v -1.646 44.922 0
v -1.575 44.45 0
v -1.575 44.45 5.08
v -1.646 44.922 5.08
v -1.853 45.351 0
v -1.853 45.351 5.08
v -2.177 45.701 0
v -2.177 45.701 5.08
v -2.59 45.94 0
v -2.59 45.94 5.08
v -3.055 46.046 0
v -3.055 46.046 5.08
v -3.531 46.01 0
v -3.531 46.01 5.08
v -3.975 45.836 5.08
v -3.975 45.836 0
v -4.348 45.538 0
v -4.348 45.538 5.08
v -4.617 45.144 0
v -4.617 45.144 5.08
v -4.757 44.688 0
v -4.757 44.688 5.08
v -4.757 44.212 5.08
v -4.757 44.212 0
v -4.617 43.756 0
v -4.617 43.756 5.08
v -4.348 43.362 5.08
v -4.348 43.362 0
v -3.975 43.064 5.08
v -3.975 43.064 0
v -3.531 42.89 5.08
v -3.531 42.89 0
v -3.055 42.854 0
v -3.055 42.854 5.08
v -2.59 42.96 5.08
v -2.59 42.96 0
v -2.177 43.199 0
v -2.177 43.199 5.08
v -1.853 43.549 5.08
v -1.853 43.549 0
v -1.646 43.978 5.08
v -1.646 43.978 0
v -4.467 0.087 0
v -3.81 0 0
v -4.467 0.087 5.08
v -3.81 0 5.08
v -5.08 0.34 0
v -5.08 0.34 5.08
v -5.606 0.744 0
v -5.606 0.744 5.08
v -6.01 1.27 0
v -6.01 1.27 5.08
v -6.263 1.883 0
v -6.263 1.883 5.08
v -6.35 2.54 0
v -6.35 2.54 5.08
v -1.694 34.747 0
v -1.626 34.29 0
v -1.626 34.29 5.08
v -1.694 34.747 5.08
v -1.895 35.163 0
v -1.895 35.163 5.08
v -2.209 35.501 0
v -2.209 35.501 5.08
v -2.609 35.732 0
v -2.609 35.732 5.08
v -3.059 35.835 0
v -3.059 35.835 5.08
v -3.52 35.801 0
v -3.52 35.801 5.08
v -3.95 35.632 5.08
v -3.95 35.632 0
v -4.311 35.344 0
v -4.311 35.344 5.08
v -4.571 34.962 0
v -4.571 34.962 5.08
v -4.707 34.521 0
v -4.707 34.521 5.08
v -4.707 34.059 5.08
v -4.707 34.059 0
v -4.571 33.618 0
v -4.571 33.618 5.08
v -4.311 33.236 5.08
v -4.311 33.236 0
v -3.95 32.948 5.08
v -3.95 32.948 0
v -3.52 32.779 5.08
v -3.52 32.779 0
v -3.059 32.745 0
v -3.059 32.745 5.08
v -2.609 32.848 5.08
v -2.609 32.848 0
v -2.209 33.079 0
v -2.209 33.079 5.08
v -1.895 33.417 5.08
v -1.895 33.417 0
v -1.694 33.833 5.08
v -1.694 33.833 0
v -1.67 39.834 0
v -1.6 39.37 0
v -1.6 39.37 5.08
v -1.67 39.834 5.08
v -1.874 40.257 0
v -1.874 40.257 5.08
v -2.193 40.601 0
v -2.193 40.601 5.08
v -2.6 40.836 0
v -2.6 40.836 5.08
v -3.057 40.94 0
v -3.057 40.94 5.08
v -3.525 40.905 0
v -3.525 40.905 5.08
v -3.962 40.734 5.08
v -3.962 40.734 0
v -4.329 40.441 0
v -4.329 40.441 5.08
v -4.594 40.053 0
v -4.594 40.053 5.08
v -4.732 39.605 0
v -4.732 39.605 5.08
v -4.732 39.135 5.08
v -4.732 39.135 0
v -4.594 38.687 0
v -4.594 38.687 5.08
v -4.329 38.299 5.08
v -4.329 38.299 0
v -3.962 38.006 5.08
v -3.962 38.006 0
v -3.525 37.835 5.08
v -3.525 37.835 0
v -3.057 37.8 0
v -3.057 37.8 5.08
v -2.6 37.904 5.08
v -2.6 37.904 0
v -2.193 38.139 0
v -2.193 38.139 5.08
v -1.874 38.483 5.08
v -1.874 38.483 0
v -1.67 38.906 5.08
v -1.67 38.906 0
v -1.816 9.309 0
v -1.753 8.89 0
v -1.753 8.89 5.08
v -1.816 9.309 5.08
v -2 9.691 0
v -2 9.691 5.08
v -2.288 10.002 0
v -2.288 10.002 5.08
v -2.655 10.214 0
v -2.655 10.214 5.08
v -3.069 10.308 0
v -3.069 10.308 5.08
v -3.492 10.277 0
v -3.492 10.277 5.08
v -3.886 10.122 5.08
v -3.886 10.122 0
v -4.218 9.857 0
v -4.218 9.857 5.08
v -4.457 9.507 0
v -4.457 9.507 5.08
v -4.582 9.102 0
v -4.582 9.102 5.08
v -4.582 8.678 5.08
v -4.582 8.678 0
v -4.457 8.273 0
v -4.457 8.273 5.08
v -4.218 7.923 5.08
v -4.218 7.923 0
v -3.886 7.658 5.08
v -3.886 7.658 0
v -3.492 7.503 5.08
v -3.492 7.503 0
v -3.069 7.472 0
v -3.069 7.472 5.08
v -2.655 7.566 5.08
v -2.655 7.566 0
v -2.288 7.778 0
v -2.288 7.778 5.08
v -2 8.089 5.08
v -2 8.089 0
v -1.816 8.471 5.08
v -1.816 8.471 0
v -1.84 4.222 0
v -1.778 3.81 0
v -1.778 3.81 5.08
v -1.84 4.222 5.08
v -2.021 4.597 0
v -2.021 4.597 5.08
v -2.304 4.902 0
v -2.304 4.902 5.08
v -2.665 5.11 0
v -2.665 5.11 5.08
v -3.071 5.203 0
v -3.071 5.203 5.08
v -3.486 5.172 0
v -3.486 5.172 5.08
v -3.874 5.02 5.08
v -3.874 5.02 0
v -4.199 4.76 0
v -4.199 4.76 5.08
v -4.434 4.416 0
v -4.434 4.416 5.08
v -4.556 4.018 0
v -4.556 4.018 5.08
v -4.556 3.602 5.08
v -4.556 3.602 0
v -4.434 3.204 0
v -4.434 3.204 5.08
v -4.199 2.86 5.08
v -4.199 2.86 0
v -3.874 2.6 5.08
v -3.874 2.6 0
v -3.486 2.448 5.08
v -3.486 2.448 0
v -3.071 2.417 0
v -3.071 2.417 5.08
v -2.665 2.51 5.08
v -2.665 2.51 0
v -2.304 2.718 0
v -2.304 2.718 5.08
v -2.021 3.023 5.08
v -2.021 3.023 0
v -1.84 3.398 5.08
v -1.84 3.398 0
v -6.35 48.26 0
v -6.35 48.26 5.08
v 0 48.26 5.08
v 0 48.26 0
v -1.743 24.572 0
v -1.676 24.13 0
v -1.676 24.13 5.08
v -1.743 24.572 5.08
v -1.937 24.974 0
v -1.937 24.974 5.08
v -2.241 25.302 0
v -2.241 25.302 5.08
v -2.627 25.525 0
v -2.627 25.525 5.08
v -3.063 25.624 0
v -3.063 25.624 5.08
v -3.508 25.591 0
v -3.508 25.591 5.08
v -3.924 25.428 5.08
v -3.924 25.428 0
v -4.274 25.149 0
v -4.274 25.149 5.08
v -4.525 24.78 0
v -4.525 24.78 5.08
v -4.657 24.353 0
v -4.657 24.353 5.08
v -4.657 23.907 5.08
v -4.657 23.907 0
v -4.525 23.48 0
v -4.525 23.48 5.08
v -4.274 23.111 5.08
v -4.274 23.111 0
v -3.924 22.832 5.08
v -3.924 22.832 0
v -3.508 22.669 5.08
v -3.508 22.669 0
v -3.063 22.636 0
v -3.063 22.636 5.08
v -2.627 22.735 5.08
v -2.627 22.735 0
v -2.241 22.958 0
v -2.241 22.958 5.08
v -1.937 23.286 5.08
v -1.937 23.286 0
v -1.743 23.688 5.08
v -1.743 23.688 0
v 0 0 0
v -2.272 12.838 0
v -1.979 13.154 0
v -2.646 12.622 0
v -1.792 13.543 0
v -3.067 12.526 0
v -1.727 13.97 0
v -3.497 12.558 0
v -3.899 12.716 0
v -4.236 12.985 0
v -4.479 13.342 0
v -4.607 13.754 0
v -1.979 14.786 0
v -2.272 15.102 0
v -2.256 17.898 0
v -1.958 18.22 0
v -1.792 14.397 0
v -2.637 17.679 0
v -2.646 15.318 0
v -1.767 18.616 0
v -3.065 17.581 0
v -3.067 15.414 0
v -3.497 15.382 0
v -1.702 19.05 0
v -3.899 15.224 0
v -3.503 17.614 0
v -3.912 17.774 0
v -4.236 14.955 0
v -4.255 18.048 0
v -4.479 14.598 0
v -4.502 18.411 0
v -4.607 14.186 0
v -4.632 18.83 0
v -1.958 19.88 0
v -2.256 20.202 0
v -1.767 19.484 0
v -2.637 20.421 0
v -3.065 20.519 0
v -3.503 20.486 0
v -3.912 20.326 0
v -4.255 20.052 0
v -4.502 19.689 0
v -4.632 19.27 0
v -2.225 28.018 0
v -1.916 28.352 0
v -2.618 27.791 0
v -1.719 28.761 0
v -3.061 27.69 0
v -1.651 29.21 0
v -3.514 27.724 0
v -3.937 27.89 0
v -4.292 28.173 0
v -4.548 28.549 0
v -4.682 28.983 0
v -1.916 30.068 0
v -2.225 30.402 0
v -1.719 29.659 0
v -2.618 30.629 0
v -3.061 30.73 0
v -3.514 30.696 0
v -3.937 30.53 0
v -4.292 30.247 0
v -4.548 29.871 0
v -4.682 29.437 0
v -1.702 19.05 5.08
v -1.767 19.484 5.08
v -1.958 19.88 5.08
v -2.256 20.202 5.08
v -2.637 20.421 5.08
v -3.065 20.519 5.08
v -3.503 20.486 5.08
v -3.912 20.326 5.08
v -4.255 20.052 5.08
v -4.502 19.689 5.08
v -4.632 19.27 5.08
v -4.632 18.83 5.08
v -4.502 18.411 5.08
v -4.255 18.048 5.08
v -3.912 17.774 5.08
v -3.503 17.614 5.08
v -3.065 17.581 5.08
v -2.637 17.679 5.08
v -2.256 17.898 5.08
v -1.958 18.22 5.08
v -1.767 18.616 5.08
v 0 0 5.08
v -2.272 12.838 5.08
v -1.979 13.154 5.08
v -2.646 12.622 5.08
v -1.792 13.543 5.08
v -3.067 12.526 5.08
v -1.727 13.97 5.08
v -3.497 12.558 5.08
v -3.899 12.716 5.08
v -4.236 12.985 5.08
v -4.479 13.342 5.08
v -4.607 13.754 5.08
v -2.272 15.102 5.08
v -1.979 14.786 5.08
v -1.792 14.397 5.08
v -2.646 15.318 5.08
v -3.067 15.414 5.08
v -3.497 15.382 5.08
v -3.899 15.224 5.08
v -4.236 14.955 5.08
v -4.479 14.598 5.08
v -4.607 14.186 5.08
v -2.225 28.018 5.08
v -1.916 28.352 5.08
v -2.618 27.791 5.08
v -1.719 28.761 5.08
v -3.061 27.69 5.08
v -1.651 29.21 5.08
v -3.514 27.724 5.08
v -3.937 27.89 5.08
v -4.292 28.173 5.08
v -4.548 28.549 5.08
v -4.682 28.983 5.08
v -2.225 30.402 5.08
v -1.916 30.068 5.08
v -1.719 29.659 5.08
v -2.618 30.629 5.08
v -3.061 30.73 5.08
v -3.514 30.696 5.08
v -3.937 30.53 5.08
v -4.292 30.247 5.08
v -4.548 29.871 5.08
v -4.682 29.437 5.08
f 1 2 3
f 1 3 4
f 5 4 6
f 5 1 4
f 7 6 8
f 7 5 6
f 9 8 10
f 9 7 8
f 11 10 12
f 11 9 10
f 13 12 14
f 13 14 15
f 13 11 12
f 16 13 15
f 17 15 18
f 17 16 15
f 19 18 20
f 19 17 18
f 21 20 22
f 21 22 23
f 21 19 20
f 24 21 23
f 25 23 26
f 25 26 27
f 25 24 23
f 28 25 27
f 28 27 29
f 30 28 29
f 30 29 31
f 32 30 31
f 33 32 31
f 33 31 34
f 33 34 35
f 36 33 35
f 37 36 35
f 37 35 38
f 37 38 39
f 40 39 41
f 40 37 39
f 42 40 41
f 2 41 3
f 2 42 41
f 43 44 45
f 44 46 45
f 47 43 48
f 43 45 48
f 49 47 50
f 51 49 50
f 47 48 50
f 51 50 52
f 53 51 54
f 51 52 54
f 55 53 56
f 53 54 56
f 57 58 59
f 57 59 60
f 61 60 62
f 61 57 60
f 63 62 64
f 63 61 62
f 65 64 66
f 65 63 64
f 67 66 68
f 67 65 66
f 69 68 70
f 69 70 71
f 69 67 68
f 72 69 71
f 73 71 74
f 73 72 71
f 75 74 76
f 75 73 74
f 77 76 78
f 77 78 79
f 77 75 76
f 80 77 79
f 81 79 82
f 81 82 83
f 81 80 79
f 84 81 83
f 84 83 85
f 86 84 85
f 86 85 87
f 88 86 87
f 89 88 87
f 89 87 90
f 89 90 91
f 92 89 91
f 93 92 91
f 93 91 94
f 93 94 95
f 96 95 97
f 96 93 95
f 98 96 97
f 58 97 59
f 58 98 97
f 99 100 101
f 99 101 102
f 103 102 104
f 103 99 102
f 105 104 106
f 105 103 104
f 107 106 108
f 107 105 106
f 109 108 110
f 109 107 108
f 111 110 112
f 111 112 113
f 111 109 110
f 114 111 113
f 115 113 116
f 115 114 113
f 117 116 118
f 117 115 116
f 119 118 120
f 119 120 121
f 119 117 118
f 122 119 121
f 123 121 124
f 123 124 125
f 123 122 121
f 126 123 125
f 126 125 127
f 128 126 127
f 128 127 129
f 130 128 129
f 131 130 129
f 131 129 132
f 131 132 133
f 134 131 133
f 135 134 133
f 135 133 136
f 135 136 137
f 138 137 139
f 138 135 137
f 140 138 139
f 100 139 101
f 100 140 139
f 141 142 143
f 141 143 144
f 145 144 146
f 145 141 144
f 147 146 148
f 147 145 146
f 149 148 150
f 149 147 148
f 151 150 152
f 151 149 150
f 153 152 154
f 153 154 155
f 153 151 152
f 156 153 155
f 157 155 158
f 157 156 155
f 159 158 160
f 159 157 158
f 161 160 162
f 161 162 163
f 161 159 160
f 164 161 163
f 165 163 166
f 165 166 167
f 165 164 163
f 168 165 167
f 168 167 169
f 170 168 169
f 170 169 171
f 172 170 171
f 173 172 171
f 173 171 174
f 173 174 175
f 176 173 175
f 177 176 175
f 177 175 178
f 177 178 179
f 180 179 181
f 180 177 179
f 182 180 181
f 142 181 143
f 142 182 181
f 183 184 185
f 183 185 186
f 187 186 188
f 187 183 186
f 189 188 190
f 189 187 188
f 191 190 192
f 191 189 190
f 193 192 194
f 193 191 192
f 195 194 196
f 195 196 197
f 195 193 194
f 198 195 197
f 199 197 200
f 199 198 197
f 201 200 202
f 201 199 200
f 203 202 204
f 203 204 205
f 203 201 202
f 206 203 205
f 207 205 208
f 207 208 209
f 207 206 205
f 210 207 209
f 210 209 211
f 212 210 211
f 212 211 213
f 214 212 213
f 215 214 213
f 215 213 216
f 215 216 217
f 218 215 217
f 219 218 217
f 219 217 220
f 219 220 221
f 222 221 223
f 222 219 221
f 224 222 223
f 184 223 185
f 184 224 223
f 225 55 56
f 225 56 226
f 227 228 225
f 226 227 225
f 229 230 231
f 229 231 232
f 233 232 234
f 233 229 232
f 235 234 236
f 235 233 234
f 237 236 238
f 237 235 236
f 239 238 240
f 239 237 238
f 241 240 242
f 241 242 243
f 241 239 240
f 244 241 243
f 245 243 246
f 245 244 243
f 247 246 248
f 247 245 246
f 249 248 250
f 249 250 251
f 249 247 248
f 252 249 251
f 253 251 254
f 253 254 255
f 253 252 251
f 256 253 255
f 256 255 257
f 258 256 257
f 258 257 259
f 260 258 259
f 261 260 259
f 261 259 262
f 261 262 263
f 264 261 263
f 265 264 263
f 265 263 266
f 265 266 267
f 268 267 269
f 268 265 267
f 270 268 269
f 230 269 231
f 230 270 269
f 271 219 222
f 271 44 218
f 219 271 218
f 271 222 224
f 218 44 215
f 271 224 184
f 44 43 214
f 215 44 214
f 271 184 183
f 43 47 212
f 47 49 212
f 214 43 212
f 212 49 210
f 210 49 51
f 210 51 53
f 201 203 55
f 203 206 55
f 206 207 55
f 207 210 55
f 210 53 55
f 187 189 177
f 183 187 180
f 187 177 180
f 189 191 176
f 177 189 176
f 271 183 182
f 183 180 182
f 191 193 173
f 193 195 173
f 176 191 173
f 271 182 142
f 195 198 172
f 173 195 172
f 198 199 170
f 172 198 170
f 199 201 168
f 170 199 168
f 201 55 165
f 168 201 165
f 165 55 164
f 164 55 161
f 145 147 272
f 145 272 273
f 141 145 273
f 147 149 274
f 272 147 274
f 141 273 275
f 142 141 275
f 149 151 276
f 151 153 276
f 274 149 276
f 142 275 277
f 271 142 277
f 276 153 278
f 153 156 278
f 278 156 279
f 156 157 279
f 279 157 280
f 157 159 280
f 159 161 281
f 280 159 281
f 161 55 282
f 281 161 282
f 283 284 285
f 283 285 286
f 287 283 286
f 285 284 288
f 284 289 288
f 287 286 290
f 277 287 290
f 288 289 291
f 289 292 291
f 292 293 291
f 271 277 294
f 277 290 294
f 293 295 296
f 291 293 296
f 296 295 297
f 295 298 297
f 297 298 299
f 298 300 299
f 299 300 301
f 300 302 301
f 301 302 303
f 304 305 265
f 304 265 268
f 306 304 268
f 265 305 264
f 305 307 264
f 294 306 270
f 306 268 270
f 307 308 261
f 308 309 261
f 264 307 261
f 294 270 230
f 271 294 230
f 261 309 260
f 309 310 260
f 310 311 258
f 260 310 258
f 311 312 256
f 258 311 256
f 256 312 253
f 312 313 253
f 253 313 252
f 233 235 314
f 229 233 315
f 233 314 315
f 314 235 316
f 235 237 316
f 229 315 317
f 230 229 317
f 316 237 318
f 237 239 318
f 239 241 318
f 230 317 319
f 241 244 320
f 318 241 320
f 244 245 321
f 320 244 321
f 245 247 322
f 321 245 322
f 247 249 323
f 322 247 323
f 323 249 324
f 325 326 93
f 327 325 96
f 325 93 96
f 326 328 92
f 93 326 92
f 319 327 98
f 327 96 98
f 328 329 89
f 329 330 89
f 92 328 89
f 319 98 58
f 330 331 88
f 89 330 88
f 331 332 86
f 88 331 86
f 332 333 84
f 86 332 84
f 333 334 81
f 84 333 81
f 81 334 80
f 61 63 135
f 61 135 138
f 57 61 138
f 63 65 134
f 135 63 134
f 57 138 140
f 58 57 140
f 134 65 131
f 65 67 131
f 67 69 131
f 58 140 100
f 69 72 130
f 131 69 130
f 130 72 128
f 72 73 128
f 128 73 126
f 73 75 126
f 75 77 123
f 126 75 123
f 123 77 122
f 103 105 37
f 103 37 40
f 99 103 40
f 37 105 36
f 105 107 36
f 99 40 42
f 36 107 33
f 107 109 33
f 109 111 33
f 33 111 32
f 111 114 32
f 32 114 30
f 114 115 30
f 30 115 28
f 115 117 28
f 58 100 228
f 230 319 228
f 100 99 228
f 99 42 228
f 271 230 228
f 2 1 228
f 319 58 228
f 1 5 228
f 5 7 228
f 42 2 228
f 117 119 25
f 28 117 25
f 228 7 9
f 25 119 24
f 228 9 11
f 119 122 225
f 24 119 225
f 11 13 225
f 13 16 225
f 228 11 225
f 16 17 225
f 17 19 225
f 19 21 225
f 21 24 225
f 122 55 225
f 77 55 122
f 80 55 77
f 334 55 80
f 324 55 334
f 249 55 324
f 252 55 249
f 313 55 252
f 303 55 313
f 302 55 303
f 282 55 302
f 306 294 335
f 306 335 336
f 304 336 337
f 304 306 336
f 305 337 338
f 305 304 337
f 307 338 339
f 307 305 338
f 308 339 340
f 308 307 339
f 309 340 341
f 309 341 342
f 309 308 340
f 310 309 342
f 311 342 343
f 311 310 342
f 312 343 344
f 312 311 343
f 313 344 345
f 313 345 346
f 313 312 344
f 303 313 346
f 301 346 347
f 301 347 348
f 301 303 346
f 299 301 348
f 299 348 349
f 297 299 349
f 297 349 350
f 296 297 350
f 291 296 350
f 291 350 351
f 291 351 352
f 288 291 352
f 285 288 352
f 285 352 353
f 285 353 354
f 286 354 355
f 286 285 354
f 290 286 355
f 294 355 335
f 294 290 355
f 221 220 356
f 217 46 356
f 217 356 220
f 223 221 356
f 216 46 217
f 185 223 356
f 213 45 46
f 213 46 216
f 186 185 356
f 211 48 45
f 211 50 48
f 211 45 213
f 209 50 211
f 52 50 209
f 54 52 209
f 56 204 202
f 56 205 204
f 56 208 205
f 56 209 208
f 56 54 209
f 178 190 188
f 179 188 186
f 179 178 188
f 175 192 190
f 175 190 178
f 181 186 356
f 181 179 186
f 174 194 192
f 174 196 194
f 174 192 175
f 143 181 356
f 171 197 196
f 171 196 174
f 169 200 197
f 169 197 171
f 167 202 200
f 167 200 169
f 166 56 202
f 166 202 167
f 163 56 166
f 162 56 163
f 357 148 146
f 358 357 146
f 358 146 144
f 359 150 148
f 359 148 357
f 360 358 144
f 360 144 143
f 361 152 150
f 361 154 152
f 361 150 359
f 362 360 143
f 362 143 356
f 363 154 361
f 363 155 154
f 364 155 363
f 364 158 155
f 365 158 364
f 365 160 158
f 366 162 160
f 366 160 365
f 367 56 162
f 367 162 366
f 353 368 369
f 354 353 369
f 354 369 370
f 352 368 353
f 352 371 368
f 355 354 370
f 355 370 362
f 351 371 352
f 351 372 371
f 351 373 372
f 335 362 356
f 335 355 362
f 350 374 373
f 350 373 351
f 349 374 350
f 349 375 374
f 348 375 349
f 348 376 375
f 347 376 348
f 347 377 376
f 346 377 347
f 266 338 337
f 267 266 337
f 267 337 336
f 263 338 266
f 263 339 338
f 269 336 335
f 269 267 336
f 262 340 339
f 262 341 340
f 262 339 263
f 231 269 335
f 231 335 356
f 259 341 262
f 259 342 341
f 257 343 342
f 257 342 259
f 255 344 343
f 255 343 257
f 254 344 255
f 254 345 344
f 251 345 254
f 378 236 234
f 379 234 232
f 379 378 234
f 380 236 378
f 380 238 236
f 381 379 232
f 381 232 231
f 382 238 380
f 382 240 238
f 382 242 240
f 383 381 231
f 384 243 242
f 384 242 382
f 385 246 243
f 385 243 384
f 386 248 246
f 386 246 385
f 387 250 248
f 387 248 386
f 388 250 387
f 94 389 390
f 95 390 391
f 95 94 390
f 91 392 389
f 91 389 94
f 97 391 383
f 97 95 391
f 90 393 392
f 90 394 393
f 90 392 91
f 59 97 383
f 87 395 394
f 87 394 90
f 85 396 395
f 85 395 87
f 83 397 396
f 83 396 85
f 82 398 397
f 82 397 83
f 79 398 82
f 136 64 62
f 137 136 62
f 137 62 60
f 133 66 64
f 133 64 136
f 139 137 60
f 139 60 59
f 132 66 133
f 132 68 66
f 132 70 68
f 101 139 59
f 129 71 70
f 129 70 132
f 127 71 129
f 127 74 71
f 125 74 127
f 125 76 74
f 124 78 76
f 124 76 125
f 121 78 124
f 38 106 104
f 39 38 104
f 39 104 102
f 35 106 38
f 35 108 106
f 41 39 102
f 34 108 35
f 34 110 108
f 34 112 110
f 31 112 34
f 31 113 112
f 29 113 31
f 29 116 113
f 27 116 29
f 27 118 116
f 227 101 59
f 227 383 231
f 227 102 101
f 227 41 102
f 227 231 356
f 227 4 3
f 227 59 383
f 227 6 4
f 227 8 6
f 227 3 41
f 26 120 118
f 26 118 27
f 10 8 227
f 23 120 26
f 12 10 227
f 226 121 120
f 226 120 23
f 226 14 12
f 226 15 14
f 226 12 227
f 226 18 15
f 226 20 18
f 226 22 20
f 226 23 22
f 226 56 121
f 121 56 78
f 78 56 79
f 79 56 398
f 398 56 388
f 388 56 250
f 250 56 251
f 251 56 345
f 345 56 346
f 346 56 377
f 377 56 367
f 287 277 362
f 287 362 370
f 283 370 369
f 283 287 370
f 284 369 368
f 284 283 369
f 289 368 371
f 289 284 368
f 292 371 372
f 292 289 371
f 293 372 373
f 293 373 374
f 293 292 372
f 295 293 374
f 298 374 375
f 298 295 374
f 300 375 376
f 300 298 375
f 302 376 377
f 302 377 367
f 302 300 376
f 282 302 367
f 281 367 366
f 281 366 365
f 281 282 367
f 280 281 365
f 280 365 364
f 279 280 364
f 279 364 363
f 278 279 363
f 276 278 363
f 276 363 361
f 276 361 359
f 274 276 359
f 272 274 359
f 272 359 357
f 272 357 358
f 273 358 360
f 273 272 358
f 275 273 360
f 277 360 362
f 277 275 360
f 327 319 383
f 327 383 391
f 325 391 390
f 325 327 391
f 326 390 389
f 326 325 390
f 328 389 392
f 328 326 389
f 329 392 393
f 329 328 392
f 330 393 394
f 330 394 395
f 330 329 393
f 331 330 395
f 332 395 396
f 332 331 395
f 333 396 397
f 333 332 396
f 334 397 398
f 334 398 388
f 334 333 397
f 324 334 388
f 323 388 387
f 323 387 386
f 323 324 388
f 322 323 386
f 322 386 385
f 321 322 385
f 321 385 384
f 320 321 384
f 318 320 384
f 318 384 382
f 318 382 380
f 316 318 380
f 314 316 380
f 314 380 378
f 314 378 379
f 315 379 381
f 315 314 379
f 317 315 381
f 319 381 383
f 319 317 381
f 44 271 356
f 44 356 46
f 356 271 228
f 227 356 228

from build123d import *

# Parameters (mm, degrees)
SKETCH1_W           = 48.26
SKETCH1_H           = 6.35
SKETCH1_R           = 1.397
SKETCH1_R_2         = 1.4224
SKETCH1_R_3         = 1.4478
SKETCH1_R_4         = 1.4732
SKETCH1_R_5         = 1.4986
SKETCH1_R_6         = 1.524
SKETCH1_R_7         = 1.5494
SKETCH1_R_8         = 1.5748
SKETCH1_R_9         = 1.6002
BOSS_EXTRUDE1_DEPTH = 5.08
FILLET1_R           = 2.54


with BuildPart() as part:
    # Sketch1 → Boss-Extrude1 (new body)
    with BuildSketch(Plane(origin=(0, 0, 0), x_dir=(0, 1, 0), z_dir=(0, 0, 1))):
        with Locations((24.13, 3.175)):
            Rectangle(SKETCH1_W, SKETCH1_H)
        with Locations(Location((3.81, 3.175, 0), (0, 0, 270))):
            Circle(SKETCH1_R, mode=Mode.SUBTRACT)
        with Locations(Location((8.89, 3.175, 0), (0, 0, 270))):
            Circle(SKETCH1_R_2, mode=Mode.SUBTRACT)
        with Locations(Location((13.97, 3.175, 0), (0, 0, 270))):
            Circle(SKETCH1_R_3, mode=Mode.SUBTRACT)
        with Locations(Location((19.05, 3.175, 0), (0, 0, 270))):
            Circle(SKETCH1_R_4, mode=Mode.SUBTRACT)
        with Locations(Location((24.13, 3.175, 0), (0, 0, 270))):
            Circle(SKETCH1_R_5, mode=Mode.SUBTRACT)
        with Locations(Location((29.21, 3.175, 0), (0, 0, 270))):
            Circle(SKETCH1_R_6, mode=Mode.SUBTRACT)
        with Locations(Location((34.29, 3.175, 0), (0, 0, 270))):
            Circle(SKETCH1_R_7, mode=Mode.SUBTRACT)
        with Locations(Location((39.37, 3.175, 0), (0, 0, 270))):
            Circle(SKETCH1_R_8, mode=Mode.SUBTRACT)
        with Locations(Location((44.45, 3.175, 0), (0, 0, 270))):
            Circle(SKETCH1_R_9, mode=Mode.SUBTRACT)
    extrude(amount=BOSS_EXTRUDE1_DEPTH)

    # Fillet1
    fillet1_edges = [part.edges().sort_by_distance(p)[0] for p in [
        (-6.35, 0, 2.54),
    ]]
    fillet(fillet1_edges, radius=FILLET1_R)


solid = part.part
